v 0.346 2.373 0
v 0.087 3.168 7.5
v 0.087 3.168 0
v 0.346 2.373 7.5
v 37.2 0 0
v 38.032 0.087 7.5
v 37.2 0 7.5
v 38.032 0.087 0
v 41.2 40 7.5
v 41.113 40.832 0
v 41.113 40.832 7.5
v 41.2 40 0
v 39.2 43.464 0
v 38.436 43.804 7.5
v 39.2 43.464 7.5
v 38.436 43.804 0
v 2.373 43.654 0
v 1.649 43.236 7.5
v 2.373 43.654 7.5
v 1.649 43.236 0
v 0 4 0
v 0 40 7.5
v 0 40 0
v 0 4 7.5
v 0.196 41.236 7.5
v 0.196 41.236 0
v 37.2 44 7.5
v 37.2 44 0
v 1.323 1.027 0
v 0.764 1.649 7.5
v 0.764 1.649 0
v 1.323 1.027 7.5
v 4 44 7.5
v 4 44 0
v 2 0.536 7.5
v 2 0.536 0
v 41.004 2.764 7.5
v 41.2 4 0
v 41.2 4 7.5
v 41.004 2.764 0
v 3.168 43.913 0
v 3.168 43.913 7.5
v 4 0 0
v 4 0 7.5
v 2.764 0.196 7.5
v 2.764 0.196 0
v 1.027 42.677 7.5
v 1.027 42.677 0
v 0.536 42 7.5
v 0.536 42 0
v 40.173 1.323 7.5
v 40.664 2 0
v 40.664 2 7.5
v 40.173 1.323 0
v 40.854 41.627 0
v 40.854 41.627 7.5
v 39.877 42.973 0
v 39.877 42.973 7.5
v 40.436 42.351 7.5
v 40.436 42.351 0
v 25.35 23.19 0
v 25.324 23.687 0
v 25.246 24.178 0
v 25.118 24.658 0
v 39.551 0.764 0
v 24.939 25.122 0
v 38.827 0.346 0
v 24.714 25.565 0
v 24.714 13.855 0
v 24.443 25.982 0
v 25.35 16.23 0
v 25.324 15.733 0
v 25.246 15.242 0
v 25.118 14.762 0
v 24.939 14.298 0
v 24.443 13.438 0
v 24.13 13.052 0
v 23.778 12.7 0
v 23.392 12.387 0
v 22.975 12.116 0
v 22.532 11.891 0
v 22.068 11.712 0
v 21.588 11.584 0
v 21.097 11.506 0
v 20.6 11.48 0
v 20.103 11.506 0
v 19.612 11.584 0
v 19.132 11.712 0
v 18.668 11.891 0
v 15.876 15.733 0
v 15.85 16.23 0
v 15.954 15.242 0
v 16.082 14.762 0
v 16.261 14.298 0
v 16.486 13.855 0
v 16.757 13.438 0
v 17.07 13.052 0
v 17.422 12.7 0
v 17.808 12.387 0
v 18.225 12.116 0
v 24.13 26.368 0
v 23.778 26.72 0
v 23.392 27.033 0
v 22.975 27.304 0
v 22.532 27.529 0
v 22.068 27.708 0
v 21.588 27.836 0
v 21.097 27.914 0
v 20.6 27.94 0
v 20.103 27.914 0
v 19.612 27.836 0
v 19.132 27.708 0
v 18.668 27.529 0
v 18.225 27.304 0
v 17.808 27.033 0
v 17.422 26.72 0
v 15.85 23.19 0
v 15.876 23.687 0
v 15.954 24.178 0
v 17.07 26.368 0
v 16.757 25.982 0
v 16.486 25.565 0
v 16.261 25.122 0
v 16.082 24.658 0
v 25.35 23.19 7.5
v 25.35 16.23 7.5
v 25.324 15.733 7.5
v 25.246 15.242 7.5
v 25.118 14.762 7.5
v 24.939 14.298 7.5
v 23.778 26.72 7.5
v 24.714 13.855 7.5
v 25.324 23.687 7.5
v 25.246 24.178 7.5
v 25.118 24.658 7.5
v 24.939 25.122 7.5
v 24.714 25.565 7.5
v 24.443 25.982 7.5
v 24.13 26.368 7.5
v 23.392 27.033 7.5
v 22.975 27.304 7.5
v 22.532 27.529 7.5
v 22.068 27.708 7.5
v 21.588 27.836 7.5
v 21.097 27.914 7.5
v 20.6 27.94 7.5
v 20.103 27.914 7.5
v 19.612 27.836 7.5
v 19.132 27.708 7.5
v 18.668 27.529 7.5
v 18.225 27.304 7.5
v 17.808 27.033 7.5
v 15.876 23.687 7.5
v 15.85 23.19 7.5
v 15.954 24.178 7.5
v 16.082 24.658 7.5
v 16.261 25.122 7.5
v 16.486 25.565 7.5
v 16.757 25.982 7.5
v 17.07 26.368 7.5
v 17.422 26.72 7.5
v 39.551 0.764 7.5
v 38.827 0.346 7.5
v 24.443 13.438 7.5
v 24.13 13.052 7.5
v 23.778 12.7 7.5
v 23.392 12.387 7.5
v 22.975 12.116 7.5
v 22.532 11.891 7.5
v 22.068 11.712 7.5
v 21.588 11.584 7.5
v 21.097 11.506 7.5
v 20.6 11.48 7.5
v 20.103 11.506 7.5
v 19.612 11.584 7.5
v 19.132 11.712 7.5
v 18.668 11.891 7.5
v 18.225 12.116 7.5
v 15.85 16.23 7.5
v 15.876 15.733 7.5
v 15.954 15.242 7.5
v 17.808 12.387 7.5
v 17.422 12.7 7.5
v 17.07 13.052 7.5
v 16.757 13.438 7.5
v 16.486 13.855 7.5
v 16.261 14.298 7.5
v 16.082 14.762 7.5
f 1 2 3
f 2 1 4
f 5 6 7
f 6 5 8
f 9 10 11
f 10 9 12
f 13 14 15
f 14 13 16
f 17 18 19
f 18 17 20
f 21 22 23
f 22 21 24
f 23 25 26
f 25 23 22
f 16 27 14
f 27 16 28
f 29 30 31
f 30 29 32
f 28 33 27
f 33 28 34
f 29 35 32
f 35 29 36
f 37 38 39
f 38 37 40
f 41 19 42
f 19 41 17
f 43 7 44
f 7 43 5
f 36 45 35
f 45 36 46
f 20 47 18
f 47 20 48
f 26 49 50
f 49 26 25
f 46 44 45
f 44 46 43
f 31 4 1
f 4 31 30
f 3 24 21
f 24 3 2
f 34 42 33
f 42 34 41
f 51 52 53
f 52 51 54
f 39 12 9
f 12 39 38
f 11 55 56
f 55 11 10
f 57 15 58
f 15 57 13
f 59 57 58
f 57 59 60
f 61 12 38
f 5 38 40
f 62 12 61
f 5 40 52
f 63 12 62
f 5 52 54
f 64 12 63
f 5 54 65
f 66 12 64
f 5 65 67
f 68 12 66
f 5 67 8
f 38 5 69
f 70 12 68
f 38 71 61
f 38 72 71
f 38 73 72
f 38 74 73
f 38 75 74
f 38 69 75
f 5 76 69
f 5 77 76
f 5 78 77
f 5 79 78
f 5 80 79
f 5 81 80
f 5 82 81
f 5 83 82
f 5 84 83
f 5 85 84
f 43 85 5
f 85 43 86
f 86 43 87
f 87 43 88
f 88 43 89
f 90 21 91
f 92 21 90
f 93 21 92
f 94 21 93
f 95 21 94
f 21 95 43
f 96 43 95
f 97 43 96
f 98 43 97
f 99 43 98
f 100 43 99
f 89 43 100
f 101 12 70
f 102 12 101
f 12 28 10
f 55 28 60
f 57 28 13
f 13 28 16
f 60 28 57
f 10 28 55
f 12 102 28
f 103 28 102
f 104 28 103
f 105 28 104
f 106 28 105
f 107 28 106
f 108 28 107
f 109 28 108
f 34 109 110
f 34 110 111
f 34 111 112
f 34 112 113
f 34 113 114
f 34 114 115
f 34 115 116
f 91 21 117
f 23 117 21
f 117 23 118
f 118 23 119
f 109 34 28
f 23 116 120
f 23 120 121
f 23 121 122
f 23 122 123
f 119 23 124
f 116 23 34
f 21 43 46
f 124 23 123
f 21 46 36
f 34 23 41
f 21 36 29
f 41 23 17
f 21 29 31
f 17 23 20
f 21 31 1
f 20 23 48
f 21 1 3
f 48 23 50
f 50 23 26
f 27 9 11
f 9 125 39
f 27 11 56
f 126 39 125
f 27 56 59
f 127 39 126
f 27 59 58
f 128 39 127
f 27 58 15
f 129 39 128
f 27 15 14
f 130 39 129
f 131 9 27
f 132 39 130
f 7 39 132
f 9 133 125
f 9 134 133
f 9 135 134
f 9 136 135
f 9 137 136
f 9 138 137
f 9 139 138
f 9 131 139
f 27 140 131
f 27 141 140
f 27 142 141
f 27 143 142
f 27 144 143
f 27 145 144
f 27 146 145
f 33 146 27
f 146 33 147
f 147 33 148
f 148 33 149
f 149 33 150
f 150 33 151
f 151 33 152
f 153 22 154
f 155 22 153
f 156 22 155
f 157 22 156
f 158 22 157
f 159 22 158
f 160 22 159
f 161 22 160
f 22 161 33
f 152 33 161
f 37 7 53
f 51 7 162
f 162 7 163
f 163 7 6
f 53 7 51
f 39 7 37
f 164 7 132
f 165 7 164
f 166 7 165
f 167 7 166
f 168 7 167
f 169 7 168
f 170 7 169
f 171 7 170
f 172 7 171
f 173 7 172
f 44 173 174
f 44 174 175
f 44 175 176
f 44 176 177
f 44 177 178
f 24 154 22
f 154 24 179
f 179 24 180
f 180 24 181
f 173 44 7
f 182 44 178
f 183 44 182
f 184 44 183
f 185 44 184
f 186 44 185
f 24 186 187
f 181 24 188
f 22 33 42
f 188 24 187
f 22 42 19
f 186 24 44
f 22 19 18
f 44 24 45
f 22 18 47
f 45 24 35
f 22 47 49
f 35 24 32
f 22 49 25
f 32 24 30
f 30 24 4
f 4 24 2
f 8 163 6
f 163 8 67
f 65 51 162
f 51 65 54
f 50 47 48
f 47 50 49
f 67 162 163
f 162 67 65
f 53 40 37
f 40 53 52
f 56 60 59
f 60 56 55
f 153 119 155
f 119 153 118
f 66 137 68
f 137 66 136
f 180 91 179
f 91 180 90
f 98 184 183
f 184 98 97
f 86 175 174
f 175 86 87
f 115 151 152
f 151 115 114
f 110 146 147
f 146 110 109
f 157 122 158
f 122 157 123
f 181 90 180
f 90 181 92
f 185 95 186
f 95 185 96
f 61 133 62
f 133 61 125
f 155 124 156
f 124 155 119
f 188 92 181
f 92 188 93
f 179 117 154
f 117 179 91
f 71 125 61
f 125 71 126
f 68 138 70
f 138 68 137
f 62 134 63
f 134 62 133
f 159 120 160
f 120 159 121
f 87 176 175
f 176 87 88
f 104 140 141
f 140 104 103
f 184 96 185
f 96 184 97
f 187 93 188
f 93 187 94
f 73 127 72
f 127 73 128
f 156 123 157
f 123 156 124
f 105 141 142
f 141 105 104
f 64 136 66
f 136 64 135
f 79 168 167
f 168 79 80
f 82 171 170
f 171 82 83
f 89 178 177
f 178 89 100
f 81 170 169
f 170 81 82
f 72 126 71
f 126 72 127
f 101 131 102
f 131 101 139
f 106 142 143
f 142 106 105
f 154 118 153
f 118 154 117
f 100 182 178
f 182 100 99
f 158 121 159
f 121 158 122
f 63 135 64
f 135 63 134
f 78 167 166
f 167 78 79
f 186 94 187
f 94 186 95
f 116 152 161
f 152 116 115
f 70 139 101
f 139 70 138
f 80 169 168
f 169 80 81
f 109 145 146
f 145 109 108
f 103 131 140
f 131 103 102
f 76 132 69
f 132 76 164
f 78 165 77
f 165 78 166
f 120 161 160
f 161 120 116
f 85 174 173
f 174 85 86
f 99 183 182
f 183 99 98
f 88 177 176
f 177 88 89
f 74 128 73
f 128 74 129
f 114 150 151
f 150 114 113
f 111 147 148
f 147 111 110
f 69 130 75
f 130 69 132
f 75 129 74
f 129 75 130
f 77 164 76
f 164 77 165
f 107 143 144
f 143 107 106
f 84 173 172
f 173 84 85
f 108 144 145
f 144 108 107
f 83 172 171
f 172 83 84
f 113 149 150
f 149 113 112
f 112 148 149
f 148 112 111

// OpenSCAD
//use <otherPeoplesWork/threads-scad/threads.scad>
use <myTools.scad>

/* [Hidden] */

x = 41.2; // TOILET 
y = 60.0 - 16; // TOILET
z = 7.5; 

$fn=60;   //circle quantize 360/10=36 degrees per side

// container for the TOILET
TOILET_outside = [ x, y, z];

module build_TOILET()
{
    difference()
    {
        // container for the TOILET
        abox( TOILET_outside, thick = -2, 
                round_out=4, 
                bSolid = true, 
                bCentered = false);

        DIA=9.5;
        
        hull()
        {
            color("RED")
            translate ([x/2  , 11.48 + DIA/2, -.1])
            {
                cylinder(d = DIA, h = 10, center = false);
                
                color("GREEN")
                translate ([0 , 16.46 - DIA, 0])
                cylinder(d = DIA, h = 10, center = false);
            }
        }
    }
 }

build_TOILET();
